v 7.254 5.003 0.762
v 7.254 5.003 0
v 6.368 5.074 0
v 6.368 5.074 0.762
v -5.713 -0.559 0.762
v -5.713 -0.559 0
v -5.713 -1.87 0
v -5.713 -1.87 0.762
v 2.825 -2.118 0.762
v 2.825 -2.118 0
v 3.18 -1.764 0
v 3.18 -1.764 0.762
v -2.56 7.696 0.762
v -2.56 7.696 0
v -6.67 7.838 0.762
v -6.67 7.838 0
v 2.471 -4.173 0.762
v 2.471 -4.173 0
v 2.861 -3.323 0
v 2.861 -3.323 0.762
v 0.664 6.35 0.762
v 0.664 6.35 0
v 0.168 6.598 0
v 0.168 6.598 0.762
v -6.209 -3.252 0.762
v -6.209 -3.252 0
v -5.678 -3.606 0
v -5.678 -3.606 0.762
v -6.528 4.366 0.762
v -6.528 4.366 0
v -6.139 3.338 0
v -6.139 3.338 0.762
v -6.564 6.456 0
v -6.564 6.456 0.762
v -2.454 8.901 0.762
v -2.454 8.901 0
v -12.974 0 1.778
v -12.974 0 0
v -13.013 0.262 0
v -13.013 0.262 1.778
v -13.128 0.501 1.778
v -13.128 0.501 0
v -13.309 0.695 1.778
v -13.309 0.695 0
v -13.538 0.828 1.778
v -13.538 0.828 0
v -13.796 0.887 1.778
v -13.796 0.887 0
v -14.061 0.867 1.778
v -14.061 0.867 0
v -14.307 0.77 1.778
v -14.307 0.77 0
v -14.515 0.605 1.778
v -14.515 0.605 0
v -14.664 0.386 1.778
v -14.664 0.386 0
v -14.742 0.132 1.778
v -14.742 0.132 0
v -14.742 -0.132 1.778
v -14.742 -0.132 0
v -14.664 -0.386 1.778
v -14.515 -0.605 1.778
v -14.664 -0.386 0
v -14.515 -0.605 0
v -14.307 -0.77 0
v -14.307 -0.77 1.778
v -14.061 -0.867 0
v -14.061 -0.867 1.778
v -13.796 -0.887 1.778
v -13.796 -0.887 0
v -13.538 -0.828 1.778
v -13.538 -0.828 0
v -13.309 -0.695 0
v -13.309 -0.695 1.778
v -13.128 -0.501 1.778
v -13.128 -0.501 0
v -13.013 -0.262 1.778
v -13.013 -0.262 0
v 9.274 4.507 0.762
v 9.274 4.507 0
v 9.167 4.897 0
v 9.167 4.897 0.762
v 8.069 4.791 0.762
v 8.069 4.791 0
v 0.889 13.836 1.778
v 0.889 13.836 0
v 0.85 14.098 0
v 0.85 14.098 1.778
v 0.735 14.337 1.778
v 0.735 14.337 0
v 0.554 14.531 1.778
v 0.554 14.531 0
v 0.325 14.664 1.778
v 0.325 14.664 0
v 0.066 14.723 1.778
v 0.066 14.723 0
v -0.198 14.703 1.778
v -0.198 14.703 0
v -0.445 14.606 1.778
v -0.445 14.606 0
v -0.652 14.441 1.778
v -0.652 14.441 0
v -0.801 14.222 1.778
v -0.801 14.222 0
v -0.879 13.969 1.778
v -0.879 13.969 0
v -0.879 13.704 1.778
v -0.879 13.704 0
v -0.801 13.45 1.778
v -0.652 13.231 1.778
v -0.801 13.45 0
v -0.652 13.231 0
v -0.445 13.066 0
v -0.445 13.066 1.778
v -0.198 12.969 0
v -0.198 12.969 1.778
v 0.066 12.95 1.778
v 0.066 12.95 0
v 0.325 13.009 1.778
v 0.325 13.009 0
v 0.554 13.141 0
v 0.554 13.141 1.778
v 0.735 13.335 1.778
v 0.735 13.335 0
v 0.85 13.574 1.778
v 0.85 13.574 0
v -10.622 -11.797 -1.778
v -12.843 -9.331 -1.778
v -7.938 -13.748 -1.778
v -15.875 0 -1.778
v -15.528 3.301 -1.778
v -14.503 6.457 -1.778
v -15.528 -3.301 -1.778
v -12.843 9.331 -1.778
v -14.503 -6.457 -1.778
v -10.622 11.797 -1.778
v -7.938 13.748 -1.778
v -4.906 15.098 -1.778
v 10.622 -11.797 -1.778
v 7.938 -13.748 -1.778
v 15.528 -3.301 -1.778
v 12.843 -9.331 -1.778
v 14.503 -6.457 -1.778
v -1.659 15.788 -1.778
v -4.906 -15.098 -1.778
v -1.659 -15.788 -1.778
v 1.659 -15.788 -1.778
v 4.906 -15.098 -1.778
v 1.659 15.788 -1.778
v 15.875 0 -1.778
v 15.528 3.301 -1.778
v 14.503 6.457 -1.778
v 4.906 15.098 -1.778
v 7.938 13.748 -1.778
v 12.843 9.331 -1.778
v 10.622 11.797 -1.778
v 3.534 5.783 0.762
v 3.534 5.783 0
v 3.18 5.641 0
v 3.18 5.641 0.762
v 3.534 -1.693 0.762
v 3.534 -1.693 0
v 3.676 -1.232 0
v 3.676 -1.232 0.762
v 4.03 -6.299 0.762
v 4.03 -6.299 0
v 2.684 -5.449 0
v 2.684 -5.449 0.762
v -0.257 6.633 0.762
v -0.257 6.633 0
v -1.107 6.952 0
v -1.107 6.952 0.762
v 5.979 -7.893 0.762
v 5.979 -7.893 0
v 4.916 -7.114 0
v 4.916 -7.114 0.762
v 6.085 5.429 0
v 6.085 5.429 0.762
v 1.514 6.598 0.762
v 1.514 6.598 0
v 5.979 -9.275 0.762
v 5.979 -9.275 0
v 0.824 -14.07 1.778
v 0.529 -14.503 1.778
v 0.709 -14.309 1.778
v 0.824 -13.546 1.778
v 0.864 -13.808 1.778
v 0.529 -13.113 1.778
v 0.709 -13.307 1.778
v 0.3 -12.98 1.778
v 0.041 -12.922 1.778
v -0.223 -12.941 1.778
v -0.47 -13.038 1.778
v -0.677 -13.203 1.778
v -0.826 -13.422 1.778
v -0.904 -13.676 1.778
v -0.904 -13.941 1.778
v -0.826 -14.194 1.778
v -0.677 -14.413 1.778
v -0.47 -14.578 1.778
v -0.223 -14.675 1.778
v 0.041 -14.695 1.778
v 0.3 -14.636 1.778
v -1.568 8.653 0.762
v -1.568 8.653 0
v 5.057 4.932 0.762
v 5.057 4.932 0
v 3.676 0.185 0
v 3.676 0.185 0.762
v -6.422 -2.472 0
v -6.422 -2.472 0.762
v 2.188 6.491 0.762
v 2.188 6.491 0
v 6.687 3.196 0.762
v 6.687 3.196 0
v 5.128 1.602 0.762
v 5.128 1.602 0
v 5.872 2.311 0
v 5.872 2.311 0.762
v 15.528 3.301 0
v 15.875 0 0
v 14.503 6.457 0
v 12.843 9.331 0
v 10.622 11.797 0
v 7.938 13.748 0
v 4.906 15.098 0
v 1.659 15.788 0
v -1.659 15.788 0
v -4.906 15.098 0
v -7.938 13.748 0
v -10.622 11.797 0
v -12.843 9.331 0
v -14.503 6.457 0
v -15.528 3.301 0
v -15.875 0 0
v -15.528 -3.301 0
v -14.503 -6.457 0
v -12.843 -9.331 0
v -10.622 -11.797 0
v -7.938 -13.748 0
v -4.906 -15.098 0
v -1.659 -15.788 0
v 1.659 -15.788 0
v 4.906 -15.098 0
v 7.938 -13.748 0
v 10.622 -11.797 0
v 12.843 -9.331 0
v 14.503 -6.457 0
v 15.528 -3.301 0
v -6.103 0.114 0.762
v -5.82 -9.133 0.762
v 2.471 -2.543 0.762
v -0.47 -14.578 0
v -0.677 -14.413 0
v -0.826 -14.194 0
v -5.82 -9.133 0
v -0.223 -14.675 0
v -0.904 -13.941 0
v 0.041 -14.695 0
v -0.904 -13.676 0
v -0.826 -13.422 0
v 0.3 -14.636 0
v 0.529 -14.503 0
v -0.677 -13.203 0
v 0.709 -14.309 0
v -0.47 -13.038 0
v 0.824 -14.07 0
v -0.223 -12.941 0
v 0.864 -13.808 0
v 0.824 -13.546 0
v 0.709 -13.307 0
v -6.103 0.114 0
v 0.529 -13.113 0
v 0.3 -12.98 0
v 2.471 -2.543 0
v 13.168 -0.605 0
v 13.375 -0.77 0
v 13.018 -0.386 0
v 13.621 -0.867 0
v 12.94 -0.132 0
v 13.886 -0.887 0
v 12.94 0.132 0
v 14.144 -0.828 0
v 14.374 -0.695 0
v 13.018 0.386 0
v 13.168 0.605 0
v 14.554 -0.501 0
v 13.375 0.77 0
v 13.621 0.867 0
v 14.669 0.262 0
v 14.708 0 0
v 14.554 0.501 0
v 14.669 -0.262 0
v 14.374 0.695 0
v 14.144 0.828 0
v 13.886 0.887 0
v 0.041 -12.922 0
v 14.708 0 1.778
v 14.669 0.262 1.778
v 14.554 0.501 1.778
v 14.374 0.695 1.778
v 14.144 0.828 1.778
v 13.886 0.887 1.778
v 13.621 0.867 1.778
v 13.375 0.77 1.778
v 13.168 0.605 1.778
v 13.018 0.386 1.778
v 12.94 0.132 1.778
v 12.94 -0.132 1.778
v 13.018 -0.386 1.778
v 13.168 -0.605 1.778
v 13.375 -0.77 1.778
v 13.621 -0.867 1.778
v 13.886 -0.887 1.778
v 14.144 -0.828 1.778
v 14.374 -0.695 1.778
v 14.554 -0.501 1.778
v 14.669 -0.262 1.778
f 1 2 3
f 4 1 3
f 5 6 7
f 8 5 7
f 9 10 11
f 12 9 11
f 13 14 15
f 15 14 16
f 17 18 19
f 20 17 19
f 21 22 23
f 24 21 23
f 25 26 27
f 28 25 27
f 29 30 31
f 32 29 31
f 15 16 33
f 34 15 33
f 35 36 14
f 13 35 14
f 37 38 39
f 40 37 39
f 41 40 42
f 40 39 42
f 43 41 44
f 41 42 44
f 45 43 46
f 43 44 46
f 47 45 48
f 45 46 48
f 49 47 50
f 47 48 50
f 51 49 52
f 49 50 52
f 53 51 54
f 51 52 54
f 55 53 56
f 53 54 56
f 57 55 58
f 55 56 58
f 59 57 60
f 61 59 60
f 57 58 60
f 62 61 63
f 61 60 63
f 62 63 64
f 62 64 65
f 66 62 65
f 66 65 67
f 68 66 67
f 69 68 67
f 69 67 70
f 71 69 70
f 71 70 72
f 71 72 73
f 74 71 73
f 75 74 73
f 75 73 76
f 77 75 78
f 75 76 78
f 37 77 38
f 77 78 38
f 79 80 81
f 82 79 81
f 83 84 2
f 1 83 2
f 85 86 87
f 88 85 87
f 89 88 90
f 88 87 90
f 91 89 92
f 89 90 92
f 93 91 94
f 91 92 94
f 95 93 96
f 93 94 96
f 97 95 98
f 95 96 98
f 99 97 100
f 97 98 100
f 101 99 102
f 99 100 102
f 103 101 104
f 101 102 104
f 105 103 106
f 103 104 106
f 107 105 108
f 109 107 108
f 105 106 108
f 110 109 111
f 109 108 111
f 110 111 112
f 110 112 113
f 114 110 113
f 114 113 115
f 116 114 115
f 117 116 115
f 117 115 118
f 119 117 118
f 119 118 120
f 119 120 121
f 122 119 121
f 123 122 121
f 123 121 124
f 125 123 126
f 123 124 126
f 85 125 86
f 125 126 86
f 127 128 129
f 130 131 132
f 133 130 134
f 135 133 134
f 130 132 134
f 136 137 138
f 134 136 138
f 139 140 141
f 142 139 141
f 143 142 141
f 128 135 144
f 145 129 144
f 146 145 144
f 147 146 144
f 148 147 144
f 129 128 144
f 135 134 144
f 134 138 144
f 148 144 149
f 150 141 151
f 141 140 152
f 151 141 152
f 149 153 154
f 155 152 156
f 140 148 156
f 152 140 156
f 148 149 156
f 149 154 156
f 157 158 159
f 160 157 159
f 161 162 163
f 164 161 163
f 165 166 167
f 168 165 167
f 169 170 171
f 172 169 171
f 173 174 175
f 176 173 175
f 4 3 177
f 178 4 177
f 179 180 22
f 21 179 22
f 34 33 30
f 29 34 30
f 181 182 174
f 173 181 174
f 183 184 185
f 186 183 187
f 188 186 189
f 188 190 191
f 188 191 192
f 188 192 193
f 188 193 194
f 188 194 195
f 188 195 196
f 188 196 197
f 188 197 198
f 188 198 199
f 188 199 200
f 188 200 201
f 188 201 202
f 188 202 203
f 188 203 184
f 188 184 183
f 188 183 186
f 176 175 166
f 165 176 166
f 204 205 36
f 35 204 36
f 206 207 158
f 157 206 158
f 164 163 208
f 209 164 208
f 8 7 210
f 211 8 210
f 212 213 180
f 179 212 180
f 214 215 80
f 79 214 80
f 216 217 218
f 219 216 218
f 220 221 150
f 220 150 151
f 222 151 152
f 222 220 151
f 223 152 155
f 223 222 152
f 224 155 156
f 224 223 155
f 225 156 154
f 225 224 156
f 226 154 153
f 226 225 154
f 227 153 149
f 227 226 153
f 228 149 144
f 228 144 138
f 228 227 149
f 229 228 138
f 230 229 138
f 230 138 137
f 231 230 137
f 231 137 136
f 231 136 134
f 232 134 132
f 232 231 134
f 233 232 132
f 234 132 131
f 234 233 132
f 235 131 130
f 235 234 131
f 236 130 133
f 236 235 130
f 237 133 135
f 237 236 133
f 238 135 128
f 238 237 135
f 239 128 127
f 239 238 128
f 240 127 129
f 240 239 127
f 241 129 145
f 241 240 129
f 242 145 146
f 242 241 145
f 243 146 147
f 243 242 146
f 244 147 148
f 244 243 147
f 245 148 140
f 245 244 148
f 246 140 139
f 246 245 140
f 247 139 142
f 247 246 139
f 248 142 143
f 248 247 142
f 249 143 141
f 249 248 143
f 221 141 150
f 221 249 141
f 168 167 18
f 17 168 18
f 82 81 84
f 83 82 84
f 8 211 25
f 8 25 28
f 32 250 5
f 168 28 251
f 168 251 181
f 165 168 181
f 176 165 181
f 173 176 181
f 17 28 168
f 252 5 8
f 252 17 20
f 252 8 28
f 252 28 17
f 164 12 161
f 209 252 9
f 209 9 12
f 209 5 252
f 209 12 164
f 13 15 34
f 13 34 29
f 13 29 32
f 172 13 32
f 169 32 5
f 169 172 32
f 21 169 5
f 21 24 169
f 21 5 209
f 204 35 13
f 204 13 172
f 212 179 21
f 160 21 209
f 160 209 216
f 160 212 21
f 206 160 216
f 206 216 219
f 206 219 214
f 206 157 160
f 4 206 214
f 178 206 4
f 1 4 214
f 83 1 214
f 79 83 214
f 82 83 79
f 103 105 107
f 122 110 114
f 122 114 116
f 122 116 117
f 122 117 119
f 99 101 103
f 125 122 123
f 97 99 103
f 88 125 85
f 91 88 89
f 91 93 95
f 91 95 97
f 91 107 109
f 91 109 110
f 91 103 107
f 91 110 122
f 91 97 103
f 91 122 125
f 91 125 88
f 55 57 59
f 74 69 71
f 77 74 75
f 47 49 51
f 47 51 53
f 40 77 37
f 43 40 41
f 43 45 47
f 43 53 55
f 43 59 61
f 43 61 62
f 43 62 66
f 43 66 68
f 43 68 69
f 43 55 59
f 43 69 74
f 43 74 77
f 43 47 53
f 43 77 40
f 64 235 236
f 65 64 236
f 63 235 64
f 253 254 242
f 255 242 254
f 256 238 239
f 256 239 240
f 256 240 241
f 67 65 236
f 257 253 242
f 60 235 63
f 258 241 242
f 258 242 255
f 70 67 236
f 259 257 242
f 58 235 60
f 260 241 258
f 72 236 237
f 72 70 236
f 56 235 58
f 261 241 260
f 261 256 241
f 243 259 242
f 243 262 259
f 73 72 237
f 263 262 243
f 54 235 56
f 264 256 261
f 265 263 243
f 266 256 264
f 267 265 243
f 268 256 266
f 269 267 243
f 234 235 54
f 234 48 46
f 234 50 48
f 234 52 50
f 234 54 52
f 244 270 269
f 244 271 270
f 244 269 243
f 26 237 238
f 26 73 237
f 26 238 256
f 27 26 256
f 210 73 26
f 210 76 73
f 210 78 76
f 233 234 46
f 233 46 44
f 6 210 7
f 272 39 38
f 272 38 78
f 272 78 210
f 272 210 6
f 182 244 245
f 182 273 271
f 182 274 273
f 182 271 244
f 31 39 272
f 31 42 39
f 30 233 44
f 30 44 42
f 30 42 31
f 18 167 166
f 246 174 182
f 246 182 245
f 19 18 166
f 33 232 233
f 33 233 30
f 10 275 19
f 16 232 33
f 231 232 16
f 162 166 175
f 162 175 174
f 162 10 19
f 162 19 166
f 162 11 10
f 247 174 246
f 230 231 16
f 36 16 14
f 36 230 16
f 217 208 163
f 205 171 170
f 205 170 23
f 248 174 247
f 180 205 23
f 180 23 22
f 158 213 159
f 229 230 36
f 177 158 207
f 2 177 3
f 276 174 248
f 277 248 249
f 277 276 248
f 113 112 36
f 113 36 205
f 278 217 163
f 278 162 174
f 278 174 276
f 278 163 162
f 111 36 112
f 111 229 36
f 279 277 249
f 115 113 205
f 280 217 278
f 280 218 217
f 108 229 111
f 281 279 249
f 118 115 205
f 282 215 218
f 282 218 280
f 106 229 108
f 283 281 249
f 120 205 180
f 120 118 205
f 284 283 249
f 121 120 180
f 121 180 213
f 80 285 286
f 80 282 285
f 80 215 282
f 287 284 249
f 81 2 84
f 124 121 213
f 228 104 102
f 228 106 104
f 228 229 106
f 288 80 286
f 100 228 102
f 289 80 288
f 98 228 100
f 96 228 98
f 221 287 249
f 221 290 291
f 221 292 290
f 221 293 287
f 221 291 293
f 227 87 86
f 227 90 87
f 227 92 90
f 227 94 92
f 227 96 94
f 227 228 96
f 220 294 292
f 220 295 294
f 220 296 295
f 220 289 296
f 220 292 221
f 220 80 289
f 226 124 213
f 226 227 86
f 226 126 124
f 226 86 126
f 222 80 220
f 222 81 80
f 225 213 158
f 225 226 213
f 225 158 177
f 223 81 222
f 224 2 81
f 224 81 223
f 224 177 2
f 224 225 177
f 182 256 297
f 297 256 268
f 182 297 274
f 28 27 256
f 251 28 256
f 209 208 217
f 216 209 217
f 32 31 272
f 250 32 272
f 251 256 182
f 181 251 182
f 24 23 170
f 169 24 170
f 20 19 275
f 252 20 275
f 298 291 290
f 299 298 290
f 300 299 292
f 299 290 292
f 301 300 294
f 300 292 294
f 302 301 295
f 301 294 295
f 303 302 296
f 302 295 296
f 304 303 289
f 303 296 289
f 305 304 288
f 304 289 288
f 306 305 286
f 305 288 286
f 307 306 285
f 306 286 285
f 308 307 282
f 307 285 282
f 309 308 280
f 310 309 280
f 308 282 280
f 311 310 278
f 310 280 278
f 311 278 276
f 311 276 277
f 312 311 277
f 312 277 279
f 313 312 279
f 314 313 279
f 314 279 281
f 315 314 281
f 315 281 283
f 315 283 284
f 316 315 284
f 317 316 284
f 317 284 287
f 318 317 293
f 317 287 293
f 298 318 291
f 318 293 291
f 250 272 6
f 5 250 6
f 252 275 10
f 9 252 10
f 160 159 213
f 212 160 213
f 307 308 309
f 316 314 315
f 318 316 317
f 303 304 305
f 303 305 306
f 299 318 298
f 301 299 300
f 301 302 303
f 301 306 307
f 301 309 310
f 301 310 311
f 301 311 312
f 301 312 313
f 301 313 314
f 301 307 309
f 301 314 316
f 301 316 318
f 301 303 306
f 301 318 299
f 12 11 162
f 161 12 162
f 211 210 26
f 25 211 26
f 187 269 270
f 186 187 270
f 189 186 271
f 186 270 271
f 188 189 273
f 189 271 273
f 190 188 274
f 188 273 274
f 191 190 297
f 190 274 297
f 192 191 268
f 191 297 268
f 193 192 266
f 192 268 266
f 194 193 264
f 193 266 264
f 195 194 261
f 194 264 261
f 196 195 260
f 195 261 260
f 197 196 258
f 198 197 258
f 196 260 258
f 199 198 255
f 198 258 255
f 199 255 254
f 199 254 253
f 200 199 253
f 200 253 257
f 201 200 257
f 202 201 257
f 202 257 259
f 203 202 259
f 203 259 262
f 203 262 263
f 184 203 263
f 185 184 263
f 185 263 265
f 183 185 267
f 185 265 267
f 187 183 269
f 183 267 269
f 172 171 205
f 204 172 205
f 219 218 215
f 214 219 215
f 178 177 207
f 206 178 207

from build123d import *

# Parameters (mm, degrees)
F0_R     = 15.875
F1_DEPTH = 1.778
F3_R     = 0.889
F4_DEPTH = 1.778
F6_DEPTH = 0.762


with BuildPart() as f1:
    # F0 (on Top) → F1 (new body)
    with BuildSketch(Plane.XY):
        Circle(F0_R)
    extrude(amount=-F1_DEPTH)

    # F3 (on face) → F4 (join)
    with BuildSketch(Plane.XY):
        with Locations((0, 13.836063)):
            Circle(F3_R)
        with Locations((-13.862842, 0)):
            Circle(F3_R)
        with Locations((-0.025139, -13.808045)):
            Circle(F3_R)
        with Locations((13.819266, 0)):
            Circle(F3_R)
    extrude(amount=F4_DEPTH)

    # F5 (on face) → F6 (join)
    with BuildSketch(Plane.XY):
        Polygon((-2.453811, 8.900641), (-2.5601, 7.696021), (-6.669981, 7.837741), (-6.563691, 6.455971), (-6.528262, 4.365601), (-6.138531, 3.338131), (-6.103101, 0.114), (-5.713371, -0.55917), (-5.713371, -1.87008), (-6.421971, -2.47239), (-6.209391, -3.251851), (-5.677941, -3.606151), (-5.819661, -9.133232), (5.978531, -9.274952), (5.978531, -7.893181), (4.915631, -7.113722), (4.029881, -6.298832), (2.68354, -5.448511), (2.47096, -4.173031), (2.860691, -3.322711), (2.47096, -2.54325), (2.82526, -2.11809), (3.17956, -1.76379), (3.53386, -1.69293), (3.675581, -1.23234), (3.675581, 0.18486), (5.128211, 1.60206), (5.872241, 2.31066), (6.687131, 3.196411), (9.273522, 4.507321), (9.167232, 4.897051), (8.068902, 4.790761), (7.254011, 5.003341), (6.368261, 5.074201), (6.084821, 5.428501), (5.057351, 4.932481), (3.53386, 5.782801), (3.17956, 5.641081), (2.18752, 6.491401), (1.51435, 6.597691), (0.66403, 6.349681), (0.16801, 6.597691), (-0.25715, 6.633121), (-1.10747, 6.951991), (-1.56806, 8.652632), align=None)
    extrude(amount=F6_DEPTH)


solid = f1.part
